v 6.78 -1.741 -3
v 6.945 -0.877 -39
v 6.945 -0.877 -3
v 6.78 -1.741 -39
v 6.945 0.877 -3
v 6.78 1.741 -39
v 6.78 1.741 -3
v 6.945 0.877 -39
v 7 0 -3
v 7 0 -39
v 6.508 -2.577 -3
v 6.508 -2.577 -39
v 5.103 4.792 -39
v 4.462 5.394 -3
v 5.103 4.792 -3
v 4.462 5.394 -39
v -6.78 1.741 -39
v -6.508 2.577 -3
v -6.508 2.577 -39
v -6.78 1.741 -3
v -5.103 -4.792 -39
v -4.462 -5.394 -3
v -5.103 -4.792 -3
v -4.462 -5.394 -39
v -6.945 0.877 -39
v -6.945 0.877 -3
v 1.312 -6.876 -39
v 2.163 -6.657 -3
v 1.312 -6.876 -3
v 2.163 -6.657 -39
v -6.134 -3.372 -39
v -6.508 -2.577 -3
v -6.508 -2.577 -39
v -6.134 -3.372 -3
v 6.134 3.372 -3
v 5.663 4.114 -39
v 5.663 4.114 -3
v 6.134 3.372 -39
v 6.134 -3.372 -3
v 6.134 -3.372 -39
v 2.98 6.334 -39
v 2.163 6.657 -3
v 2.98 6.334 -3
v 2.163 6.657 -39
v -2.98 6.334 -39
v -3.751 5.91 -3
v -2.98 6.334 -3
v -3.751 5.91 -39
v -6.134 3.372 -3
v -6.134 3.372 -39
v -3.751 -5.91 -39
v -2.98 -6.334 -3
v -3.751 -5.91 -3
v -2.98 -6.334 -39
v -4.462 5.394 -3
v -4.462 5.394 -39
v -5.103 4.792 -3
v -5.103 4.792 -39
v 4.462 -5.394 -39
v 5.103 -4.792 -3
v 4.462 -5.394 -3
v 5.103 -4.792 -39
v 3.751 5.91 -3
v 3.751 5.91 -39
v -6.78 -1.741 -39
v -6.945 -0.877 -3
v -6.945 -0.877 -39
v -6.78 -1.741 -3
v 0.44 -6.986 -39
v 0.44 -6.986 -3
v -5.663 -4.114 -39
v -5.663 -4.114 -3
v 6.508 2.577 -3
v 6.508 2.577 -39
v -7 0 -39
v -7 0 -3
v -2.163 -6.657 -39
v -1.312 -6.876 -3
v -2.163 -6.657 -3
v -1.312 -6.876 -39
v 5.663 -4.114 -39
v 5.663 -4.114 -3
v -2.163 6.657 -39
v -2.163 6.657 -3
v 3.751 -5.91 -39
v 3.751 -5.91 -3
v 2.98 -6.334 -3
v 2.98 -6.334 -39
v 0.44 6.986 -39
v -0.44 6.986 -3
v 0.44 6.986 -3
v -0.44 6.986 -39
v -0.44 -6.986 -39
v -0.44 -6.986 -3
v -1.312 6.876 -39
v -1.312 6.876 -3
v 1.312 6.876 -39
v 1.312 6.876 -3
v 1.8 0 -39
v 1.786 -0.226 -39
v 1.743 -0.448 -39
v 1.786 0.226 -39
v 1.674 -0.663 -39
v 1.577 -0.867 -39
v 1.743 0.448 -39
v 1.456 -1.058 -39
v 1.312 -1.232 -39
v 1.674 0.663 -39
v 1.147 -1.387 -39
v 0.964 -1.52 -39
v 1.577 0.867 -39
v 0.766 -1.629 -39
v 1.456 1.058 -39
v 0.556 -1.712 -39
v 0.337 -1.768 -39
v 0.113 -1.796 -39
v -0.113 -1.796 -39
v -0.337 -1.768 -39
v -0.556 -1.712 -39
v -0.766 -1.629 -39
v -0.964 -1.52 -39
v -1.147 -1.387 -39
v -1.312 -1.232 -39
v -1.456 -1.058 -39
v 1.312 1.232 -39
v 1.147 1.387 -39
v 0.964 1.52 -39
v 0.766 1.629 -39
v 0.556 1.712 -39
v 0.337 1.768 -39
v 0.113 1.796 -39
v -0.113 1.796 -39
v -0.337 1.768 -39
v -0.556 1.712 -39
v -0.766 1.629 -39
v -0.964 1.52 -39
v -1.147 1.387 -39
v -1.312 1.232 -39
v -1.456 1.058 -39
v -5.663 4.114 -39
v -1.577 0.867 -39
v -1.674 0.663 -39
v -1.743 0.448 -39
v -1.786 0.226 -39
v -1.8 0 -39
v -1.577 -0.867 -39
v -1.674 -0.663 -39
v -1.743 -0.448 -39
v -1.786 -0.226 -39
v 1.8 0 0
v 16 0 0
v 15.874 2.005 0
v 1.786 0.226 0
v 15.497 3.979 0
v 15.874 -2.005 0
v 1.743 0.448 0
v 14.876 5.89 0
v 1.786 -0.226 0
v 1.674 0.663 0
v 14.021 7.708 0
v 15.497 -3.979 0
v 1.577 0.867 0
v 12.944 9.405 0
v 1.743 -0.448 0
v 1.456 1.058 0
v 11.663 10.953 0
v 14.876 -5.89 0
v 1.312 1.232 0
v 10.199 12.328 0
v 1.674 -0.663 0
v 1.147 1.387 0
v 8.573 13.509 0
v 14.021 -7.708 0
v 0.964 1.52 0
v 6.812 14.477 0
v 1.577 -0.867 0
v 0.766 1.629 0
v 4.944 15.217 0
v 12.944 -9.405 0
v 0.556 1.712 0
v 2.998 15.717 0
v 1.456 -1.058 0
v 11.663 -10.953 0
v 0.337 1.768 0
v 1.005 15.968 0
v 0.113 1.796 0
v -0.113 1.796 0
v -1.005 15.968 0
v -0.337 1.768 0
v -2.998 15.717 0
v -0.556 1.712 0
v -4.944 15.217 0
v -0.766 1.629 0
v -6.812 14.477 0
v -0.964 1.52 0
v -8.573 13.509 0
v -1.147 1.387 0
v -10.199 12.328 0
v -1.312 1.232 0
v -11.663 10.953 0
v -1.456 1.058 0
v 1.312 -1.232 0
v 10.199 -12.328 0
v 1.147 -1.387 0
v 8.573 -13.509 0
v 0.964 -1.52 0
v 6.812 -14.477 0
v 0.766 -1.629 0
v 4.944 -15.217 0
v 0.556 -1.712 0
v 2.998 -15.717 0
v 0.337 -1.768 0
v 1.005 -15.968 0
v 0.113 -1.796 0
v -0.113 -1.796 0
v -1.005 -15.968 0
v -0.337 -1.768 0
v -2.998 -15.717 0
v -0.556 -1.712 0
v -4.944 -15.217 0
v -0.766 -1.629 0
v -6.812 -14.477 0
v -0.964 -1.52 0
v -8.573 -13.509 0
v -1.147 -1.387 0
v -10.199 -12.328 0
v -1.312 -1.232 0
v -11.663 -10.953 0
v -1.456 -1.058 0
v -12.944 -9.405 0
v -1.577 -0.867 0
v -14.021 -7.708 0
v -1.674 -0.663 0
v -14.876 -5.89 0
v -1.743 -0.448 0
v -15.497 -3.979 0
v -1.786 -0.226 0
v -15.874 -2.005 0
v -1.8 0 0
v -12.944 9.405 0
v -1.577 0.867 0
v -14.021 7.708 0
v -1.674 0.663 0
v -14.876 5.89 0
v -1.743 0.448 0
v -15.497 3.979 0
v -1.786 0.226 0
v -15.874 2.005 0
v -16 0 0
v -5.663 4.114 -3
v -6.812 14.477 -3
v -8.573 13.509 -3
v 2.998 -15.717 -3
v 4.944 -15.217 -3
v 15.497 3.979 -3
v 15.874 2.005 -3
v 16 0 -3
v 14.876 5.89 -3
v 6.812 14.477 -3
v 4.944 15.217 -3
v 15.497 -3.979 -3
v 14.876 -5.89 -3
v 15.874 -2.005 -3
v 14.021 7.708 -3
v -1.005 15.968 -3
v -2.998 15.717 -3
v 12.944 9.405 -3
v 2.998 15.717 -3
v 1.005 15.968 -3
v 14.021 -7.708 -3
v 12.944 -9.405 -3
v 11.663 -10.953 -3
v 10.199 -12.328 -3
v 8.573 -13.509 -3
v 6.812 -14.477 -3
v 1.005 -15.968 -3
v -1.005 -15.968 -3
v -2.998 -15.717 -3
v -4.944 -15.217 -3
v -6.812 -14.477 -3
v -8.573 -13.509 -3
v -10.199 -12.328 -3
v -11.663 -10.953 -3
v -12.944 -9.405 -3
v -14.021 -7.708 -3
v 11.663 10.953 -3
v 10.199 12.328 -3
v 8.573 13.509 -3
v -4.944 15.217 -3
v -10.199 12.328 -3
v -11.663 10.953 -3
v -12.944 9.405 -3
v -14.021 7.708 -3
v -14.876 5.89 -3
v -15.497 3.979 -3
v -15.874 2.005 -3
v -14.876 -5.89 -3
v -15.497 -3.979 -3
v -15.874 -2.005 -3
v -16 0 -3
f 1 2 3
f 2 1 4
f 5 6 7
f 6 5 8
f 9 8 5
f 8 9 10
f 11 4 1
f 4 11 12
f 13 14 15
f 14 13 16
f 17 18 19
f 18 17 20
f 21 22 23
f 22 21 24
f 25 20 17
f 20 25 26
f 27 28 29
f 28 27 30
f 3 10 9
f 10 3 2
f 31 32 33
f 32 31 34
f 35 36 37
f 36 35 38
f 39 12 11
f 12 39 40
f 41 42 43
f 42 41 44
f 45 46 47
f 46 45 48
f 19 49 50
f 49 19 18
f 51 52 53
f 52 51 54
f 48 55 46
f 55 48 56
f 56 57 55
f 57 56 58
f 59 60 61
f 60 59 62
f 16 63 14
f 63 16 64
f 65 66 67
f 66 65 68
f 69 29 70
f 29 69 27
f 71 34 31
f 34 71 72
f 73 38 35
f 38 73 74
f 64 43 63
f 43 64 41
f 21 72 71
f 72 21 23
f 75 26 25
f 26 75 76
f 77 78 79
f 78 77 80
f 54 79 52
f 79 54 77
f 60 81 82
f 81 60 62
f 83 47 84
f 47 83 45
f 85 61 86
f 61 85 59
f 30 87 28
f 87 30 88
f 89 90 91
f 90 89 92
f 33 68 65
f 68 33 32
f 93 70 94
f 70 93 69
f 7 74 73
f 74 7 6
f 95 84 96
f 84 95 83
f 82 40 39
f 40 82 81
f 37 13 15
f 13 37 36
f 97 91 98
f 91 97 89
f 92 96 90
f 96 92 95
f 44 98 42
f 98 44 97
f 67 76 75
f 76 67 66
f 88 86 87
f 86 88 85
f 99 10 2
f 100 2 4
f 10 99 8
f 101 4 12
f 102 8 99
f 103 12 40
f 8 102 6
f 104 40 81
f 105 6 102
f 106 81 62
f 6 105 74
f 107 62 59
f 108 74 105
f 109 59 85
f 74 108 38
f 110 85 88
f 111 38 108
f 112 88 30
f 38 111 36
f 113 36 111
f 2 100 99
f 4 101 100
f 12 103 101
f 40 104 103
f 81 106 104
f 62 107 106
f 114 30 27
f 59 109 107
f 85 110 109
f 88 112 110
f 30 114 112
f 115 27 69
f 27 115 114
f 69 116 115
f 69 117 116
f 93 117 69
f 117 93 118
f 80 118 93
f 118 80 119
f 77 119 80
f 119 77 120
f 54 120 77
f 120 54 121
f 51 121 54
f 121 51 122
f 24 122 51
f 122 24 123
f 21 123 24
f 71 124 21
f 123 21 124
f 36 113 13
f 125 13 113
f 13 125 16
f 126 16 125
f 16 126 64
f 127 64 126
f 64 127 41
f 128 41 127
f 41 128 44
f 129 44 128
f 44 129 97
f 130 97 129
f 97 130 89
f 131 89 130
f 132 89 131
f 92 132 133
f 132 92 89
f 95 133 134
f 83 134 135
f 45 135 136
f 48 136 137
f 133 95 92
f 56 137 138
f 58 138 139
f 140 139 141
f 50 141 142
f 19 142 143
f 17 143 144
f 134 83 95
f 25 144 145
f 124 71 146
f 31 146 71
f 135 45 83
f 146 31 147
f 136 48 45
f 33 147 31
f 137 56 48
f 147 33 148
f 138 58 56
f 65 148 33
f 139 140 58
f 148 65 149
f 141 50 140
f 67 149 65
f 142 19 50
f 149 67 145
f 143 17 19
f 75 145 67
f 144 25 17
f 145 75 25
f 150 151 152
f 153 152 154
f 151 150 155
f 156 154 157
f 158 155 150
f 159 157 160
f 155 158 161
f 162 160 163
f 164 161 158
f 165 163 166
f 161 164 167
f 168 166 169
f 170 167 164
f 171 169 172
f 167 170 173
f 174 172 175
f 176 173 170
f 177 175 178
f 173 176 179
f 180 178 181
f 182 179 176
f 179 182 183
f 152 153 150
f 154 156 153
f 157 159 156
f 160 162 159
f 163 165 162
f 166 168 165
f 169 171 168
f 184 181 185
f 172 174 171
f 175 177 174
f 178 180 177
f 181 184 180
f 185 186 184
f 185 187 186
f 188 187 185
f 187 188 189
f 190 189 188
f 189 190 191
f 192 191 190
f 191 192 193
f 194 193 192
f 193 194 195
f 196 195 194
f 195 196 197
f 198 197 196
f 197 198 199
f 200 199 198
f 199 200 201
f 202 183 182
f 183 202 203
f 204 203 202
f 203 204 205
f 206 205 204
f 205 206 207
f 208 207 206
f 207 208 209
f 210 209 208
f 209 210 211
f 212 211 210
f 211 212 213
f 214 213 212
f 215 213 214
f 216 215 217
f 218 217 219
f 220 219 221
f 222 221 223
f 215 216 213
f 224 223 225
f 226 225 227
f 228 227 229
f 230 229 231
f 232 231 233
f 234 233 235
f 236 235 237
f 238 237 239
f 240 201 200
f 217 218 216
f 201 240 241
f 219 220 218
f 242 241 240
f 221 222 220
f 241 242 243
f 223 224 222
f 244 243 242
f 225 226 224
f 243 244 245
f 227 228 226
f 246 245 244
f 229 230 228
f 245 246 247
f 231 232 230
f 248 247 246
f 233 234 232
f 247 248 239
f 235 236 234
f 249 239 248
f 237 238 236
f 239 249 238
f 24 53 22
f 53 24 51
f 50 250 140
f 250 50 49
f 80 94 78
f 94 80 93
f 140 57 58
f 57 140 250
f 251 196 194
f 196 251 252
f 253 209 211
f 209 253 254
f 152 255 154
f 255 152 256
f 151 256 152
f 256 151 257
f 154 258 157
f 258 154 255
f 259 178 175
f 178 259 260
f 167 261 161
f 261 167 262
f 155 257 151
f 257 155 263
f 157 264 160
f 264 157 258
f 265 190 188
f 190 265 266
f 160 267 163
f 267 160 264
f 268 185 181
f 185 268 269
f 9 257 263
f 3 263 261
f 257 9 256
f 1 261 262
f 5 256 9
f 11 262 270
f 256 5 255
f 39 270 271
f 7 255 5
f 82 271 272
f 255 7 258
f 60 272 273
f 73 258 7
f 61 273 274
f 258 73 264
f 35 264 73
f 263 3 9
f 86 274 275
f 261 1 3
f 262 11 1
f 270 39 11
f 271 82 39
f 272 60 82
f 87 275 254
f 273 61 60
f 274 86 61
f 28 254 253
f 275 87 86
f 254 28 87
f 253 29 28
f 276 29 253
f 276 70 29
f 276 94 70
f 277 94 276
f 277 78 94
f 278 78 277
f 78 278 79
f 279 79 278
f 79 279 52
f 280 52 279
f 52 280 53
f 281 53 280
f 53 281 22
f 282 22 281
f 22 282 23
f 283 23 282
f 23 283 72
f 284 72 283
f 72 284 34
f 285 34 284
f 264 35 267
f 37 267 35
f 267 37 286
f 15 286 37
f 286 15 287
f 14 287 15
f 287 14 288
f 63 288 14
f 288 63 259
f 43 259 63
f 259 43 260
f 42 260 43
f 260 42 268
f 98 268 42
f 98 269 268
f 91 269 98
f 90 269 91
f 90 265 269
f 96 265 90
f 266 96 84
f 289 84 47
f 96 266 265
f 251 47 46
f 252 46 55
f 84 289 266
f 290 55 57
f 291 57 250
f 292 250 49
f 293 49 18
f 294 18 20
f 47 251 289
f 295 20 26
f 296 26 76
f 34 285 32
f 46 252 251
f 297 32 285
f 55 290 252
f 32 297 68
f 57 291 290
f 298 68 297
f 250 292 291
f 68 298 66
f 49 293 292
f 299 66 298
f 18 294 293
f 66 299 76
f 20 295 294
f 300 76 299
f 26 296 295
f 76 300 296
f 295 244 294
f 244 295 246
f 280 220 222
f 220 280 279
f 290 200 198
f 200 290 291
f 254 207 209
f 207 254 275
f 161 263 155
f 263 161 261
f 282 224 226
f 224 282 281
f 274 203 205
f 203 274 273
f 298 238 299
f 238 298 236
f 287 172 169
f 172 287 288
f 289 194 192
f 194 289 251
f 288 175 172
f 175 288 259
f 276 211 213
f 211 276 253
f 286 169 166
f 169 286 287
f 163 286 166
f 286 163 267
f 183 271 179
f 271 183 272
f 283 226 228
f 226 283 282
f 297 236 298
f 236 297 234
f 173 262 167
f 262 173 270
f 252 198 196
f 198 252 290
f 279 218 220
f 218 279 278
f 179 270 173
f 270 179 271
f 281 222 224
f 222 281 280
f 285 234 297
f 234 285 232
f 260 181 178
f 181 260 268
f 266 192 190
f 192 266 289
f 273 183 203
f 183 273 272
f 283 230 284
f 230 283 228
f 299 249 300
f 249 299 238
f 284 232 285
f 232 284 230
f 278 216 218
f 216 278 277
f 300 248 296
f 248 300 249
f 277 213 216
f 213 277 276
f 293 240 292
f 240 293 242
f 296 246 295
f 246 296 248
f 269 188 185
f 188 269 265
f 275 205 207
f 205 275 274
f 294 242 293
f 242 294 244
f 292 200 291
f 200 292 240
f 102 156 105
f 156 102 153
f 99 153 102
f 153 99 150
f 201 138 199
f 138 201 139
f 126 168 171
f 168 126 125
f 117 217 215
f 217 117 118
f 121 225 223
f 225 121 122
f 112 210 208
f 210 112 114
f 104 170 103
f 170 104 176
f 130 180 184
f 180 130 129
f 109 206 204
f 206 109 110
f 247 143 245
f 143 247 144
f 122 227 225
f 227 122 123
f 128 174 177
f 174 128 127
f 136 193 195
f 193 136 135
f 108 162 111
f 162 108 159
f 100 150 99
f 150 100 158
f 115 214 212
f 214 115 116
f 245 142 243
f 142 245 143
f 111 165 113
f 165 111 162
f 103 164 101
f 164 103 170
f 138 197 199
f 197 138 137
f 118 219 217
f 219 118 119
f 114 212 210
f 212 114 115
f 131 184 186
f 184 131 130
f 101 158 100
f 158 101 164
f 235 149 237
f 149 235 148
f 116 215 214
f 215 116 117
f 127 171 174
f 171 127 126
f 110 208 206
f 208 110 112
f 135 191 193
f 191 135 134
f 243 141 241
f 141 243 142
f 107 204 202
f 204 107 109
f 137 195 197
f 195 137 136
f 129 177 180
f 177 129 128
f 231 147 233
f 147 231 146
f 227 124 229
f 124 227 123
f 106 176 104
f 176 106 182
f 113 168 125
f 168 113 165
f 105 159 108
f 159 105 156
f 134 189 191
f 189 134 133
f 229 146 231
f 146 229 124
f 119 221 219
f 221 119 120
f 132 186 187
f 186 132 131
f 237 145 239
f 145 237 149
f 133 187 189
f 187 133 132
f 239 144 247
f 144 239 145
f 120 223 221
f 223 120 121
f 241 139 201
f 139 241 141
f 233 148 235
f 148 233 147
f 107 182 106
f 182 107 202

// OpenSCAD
$fn = 50;


difference() {
	union() {
		translate(v = [0, 0, -39.0000000000]) {
			cylinder(h = 39, r = 7.0000000000);
		}
		translate(v = [0, 0, -3.0000000000]) {
			cylinder(h = 3, r = 16.0000000000);
		}
	}
	union() {
		#translate(v = [0, 0, -39]) {
			cylinder(h = 39, r = 1.8000000000);
		}
	}
}
